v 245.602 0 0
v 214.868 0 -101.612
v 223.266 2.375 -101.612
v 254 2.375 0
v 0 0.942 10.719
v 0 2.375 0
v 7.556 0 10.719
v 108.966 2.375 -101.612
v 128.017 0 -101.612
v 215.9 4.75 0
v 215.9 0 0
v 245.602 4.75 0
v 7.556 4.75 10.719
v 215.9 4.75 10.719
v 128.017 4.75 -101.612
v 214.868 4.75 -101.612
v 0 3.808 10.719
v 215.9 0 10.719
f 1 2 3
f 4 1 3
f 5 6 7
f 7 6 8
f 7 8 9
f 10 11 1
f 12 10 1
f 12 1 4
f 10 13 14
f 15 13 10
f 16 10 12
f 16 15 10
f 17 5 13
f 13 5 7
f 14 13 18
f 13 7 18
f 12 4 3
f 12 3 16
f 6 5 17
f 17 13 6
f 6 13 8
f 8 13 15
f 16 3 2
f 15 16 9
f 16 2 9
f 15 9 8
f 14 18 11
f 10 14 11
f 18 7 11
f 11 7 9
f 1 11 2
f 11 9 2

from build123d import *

# Parameters (mm, degrees)
SKETCH2_W               = 215.9
SKETCH2_H               = 10.7188
BOSS_EXTRUDE1_DEPTH     = 4.7498
CUT_EXTRUDE1_DEPTH      = 127
CUT_EXTRUDE2_DEPTH      = 184.509479274
CUT_EXTRUDE2_DEPTH_BACK = 184.509479274


with BuildPart() as part:
    # Sketch2 → Boss-Extrude1 (new body)
    with BuildSketch(Plane(origin=(0, 0, 0), x_dir=(1, 0, 0), z_dir=(0, 1, 0))):
        Polygon((108.966, 101.612438876), (0, 0), (215.9, 0), (254, 0), (223.266, 101.612438876), align=None)
        with Locations((107.95, -5.3594)):
            Rectangle(SKETCH2_W, SKETCH2_H)
    extrude(amount=BOSS_EXTRUDE1_DEPTH)

    # Sketch11 → Cut-Extrude1 (cut)
    with BuildSketch(Plane(origin=(21.289272777, 0, 70.386377589), x_dir=(-0.9571749920693967, 0, 0.2895099904268422), z_dir=(-0.2895099904268422, 0, -0.9571749920693967))):
        Polygon((-243.122447986, 2.3749), (-235.083929839, 4.7498), (-235.083929839, 6.735693681), (-246.008613283, 6.735693681), (-246.008613283, -1.683735196), (-235.083929839, -1.683735196), (-235.083929839, 0), align=None)
    extrude(amount=CUT_EXTRUDE1_DEPTH, mode=Mode.SUBTRACT)

    # Sketch9 → Cut-Extrude2 (cut, two sides: drawn at the far end of the back side and taken through both)
    with BuildSketch(Plane(origin=(108.966, 0, -101.612438876), x_dir=(0.6819983600624973, 0, 0.7313537016191718), z_dir=(-0.7313537016191718, 0, 0.6819983600624973)).offset(-CUT_EXTRUDE2_DEPTH_BACK)):
        Polygon((0, 2.3749), (12.992733122, 0), (12.992733122, -1.975315997), (-2.377492565, -1.975315997), (-2.377492565, 7.448660166), (12.992733122, 7.448660166), (12.992733122, 4.7498), align=None)
    extrude(amount=CUT_EXTRUDE2_DEPTH + CUT_EXTRUDE2_DEPTH_BACK, mode=Mode.SUBTRACT)


solid = part.part
